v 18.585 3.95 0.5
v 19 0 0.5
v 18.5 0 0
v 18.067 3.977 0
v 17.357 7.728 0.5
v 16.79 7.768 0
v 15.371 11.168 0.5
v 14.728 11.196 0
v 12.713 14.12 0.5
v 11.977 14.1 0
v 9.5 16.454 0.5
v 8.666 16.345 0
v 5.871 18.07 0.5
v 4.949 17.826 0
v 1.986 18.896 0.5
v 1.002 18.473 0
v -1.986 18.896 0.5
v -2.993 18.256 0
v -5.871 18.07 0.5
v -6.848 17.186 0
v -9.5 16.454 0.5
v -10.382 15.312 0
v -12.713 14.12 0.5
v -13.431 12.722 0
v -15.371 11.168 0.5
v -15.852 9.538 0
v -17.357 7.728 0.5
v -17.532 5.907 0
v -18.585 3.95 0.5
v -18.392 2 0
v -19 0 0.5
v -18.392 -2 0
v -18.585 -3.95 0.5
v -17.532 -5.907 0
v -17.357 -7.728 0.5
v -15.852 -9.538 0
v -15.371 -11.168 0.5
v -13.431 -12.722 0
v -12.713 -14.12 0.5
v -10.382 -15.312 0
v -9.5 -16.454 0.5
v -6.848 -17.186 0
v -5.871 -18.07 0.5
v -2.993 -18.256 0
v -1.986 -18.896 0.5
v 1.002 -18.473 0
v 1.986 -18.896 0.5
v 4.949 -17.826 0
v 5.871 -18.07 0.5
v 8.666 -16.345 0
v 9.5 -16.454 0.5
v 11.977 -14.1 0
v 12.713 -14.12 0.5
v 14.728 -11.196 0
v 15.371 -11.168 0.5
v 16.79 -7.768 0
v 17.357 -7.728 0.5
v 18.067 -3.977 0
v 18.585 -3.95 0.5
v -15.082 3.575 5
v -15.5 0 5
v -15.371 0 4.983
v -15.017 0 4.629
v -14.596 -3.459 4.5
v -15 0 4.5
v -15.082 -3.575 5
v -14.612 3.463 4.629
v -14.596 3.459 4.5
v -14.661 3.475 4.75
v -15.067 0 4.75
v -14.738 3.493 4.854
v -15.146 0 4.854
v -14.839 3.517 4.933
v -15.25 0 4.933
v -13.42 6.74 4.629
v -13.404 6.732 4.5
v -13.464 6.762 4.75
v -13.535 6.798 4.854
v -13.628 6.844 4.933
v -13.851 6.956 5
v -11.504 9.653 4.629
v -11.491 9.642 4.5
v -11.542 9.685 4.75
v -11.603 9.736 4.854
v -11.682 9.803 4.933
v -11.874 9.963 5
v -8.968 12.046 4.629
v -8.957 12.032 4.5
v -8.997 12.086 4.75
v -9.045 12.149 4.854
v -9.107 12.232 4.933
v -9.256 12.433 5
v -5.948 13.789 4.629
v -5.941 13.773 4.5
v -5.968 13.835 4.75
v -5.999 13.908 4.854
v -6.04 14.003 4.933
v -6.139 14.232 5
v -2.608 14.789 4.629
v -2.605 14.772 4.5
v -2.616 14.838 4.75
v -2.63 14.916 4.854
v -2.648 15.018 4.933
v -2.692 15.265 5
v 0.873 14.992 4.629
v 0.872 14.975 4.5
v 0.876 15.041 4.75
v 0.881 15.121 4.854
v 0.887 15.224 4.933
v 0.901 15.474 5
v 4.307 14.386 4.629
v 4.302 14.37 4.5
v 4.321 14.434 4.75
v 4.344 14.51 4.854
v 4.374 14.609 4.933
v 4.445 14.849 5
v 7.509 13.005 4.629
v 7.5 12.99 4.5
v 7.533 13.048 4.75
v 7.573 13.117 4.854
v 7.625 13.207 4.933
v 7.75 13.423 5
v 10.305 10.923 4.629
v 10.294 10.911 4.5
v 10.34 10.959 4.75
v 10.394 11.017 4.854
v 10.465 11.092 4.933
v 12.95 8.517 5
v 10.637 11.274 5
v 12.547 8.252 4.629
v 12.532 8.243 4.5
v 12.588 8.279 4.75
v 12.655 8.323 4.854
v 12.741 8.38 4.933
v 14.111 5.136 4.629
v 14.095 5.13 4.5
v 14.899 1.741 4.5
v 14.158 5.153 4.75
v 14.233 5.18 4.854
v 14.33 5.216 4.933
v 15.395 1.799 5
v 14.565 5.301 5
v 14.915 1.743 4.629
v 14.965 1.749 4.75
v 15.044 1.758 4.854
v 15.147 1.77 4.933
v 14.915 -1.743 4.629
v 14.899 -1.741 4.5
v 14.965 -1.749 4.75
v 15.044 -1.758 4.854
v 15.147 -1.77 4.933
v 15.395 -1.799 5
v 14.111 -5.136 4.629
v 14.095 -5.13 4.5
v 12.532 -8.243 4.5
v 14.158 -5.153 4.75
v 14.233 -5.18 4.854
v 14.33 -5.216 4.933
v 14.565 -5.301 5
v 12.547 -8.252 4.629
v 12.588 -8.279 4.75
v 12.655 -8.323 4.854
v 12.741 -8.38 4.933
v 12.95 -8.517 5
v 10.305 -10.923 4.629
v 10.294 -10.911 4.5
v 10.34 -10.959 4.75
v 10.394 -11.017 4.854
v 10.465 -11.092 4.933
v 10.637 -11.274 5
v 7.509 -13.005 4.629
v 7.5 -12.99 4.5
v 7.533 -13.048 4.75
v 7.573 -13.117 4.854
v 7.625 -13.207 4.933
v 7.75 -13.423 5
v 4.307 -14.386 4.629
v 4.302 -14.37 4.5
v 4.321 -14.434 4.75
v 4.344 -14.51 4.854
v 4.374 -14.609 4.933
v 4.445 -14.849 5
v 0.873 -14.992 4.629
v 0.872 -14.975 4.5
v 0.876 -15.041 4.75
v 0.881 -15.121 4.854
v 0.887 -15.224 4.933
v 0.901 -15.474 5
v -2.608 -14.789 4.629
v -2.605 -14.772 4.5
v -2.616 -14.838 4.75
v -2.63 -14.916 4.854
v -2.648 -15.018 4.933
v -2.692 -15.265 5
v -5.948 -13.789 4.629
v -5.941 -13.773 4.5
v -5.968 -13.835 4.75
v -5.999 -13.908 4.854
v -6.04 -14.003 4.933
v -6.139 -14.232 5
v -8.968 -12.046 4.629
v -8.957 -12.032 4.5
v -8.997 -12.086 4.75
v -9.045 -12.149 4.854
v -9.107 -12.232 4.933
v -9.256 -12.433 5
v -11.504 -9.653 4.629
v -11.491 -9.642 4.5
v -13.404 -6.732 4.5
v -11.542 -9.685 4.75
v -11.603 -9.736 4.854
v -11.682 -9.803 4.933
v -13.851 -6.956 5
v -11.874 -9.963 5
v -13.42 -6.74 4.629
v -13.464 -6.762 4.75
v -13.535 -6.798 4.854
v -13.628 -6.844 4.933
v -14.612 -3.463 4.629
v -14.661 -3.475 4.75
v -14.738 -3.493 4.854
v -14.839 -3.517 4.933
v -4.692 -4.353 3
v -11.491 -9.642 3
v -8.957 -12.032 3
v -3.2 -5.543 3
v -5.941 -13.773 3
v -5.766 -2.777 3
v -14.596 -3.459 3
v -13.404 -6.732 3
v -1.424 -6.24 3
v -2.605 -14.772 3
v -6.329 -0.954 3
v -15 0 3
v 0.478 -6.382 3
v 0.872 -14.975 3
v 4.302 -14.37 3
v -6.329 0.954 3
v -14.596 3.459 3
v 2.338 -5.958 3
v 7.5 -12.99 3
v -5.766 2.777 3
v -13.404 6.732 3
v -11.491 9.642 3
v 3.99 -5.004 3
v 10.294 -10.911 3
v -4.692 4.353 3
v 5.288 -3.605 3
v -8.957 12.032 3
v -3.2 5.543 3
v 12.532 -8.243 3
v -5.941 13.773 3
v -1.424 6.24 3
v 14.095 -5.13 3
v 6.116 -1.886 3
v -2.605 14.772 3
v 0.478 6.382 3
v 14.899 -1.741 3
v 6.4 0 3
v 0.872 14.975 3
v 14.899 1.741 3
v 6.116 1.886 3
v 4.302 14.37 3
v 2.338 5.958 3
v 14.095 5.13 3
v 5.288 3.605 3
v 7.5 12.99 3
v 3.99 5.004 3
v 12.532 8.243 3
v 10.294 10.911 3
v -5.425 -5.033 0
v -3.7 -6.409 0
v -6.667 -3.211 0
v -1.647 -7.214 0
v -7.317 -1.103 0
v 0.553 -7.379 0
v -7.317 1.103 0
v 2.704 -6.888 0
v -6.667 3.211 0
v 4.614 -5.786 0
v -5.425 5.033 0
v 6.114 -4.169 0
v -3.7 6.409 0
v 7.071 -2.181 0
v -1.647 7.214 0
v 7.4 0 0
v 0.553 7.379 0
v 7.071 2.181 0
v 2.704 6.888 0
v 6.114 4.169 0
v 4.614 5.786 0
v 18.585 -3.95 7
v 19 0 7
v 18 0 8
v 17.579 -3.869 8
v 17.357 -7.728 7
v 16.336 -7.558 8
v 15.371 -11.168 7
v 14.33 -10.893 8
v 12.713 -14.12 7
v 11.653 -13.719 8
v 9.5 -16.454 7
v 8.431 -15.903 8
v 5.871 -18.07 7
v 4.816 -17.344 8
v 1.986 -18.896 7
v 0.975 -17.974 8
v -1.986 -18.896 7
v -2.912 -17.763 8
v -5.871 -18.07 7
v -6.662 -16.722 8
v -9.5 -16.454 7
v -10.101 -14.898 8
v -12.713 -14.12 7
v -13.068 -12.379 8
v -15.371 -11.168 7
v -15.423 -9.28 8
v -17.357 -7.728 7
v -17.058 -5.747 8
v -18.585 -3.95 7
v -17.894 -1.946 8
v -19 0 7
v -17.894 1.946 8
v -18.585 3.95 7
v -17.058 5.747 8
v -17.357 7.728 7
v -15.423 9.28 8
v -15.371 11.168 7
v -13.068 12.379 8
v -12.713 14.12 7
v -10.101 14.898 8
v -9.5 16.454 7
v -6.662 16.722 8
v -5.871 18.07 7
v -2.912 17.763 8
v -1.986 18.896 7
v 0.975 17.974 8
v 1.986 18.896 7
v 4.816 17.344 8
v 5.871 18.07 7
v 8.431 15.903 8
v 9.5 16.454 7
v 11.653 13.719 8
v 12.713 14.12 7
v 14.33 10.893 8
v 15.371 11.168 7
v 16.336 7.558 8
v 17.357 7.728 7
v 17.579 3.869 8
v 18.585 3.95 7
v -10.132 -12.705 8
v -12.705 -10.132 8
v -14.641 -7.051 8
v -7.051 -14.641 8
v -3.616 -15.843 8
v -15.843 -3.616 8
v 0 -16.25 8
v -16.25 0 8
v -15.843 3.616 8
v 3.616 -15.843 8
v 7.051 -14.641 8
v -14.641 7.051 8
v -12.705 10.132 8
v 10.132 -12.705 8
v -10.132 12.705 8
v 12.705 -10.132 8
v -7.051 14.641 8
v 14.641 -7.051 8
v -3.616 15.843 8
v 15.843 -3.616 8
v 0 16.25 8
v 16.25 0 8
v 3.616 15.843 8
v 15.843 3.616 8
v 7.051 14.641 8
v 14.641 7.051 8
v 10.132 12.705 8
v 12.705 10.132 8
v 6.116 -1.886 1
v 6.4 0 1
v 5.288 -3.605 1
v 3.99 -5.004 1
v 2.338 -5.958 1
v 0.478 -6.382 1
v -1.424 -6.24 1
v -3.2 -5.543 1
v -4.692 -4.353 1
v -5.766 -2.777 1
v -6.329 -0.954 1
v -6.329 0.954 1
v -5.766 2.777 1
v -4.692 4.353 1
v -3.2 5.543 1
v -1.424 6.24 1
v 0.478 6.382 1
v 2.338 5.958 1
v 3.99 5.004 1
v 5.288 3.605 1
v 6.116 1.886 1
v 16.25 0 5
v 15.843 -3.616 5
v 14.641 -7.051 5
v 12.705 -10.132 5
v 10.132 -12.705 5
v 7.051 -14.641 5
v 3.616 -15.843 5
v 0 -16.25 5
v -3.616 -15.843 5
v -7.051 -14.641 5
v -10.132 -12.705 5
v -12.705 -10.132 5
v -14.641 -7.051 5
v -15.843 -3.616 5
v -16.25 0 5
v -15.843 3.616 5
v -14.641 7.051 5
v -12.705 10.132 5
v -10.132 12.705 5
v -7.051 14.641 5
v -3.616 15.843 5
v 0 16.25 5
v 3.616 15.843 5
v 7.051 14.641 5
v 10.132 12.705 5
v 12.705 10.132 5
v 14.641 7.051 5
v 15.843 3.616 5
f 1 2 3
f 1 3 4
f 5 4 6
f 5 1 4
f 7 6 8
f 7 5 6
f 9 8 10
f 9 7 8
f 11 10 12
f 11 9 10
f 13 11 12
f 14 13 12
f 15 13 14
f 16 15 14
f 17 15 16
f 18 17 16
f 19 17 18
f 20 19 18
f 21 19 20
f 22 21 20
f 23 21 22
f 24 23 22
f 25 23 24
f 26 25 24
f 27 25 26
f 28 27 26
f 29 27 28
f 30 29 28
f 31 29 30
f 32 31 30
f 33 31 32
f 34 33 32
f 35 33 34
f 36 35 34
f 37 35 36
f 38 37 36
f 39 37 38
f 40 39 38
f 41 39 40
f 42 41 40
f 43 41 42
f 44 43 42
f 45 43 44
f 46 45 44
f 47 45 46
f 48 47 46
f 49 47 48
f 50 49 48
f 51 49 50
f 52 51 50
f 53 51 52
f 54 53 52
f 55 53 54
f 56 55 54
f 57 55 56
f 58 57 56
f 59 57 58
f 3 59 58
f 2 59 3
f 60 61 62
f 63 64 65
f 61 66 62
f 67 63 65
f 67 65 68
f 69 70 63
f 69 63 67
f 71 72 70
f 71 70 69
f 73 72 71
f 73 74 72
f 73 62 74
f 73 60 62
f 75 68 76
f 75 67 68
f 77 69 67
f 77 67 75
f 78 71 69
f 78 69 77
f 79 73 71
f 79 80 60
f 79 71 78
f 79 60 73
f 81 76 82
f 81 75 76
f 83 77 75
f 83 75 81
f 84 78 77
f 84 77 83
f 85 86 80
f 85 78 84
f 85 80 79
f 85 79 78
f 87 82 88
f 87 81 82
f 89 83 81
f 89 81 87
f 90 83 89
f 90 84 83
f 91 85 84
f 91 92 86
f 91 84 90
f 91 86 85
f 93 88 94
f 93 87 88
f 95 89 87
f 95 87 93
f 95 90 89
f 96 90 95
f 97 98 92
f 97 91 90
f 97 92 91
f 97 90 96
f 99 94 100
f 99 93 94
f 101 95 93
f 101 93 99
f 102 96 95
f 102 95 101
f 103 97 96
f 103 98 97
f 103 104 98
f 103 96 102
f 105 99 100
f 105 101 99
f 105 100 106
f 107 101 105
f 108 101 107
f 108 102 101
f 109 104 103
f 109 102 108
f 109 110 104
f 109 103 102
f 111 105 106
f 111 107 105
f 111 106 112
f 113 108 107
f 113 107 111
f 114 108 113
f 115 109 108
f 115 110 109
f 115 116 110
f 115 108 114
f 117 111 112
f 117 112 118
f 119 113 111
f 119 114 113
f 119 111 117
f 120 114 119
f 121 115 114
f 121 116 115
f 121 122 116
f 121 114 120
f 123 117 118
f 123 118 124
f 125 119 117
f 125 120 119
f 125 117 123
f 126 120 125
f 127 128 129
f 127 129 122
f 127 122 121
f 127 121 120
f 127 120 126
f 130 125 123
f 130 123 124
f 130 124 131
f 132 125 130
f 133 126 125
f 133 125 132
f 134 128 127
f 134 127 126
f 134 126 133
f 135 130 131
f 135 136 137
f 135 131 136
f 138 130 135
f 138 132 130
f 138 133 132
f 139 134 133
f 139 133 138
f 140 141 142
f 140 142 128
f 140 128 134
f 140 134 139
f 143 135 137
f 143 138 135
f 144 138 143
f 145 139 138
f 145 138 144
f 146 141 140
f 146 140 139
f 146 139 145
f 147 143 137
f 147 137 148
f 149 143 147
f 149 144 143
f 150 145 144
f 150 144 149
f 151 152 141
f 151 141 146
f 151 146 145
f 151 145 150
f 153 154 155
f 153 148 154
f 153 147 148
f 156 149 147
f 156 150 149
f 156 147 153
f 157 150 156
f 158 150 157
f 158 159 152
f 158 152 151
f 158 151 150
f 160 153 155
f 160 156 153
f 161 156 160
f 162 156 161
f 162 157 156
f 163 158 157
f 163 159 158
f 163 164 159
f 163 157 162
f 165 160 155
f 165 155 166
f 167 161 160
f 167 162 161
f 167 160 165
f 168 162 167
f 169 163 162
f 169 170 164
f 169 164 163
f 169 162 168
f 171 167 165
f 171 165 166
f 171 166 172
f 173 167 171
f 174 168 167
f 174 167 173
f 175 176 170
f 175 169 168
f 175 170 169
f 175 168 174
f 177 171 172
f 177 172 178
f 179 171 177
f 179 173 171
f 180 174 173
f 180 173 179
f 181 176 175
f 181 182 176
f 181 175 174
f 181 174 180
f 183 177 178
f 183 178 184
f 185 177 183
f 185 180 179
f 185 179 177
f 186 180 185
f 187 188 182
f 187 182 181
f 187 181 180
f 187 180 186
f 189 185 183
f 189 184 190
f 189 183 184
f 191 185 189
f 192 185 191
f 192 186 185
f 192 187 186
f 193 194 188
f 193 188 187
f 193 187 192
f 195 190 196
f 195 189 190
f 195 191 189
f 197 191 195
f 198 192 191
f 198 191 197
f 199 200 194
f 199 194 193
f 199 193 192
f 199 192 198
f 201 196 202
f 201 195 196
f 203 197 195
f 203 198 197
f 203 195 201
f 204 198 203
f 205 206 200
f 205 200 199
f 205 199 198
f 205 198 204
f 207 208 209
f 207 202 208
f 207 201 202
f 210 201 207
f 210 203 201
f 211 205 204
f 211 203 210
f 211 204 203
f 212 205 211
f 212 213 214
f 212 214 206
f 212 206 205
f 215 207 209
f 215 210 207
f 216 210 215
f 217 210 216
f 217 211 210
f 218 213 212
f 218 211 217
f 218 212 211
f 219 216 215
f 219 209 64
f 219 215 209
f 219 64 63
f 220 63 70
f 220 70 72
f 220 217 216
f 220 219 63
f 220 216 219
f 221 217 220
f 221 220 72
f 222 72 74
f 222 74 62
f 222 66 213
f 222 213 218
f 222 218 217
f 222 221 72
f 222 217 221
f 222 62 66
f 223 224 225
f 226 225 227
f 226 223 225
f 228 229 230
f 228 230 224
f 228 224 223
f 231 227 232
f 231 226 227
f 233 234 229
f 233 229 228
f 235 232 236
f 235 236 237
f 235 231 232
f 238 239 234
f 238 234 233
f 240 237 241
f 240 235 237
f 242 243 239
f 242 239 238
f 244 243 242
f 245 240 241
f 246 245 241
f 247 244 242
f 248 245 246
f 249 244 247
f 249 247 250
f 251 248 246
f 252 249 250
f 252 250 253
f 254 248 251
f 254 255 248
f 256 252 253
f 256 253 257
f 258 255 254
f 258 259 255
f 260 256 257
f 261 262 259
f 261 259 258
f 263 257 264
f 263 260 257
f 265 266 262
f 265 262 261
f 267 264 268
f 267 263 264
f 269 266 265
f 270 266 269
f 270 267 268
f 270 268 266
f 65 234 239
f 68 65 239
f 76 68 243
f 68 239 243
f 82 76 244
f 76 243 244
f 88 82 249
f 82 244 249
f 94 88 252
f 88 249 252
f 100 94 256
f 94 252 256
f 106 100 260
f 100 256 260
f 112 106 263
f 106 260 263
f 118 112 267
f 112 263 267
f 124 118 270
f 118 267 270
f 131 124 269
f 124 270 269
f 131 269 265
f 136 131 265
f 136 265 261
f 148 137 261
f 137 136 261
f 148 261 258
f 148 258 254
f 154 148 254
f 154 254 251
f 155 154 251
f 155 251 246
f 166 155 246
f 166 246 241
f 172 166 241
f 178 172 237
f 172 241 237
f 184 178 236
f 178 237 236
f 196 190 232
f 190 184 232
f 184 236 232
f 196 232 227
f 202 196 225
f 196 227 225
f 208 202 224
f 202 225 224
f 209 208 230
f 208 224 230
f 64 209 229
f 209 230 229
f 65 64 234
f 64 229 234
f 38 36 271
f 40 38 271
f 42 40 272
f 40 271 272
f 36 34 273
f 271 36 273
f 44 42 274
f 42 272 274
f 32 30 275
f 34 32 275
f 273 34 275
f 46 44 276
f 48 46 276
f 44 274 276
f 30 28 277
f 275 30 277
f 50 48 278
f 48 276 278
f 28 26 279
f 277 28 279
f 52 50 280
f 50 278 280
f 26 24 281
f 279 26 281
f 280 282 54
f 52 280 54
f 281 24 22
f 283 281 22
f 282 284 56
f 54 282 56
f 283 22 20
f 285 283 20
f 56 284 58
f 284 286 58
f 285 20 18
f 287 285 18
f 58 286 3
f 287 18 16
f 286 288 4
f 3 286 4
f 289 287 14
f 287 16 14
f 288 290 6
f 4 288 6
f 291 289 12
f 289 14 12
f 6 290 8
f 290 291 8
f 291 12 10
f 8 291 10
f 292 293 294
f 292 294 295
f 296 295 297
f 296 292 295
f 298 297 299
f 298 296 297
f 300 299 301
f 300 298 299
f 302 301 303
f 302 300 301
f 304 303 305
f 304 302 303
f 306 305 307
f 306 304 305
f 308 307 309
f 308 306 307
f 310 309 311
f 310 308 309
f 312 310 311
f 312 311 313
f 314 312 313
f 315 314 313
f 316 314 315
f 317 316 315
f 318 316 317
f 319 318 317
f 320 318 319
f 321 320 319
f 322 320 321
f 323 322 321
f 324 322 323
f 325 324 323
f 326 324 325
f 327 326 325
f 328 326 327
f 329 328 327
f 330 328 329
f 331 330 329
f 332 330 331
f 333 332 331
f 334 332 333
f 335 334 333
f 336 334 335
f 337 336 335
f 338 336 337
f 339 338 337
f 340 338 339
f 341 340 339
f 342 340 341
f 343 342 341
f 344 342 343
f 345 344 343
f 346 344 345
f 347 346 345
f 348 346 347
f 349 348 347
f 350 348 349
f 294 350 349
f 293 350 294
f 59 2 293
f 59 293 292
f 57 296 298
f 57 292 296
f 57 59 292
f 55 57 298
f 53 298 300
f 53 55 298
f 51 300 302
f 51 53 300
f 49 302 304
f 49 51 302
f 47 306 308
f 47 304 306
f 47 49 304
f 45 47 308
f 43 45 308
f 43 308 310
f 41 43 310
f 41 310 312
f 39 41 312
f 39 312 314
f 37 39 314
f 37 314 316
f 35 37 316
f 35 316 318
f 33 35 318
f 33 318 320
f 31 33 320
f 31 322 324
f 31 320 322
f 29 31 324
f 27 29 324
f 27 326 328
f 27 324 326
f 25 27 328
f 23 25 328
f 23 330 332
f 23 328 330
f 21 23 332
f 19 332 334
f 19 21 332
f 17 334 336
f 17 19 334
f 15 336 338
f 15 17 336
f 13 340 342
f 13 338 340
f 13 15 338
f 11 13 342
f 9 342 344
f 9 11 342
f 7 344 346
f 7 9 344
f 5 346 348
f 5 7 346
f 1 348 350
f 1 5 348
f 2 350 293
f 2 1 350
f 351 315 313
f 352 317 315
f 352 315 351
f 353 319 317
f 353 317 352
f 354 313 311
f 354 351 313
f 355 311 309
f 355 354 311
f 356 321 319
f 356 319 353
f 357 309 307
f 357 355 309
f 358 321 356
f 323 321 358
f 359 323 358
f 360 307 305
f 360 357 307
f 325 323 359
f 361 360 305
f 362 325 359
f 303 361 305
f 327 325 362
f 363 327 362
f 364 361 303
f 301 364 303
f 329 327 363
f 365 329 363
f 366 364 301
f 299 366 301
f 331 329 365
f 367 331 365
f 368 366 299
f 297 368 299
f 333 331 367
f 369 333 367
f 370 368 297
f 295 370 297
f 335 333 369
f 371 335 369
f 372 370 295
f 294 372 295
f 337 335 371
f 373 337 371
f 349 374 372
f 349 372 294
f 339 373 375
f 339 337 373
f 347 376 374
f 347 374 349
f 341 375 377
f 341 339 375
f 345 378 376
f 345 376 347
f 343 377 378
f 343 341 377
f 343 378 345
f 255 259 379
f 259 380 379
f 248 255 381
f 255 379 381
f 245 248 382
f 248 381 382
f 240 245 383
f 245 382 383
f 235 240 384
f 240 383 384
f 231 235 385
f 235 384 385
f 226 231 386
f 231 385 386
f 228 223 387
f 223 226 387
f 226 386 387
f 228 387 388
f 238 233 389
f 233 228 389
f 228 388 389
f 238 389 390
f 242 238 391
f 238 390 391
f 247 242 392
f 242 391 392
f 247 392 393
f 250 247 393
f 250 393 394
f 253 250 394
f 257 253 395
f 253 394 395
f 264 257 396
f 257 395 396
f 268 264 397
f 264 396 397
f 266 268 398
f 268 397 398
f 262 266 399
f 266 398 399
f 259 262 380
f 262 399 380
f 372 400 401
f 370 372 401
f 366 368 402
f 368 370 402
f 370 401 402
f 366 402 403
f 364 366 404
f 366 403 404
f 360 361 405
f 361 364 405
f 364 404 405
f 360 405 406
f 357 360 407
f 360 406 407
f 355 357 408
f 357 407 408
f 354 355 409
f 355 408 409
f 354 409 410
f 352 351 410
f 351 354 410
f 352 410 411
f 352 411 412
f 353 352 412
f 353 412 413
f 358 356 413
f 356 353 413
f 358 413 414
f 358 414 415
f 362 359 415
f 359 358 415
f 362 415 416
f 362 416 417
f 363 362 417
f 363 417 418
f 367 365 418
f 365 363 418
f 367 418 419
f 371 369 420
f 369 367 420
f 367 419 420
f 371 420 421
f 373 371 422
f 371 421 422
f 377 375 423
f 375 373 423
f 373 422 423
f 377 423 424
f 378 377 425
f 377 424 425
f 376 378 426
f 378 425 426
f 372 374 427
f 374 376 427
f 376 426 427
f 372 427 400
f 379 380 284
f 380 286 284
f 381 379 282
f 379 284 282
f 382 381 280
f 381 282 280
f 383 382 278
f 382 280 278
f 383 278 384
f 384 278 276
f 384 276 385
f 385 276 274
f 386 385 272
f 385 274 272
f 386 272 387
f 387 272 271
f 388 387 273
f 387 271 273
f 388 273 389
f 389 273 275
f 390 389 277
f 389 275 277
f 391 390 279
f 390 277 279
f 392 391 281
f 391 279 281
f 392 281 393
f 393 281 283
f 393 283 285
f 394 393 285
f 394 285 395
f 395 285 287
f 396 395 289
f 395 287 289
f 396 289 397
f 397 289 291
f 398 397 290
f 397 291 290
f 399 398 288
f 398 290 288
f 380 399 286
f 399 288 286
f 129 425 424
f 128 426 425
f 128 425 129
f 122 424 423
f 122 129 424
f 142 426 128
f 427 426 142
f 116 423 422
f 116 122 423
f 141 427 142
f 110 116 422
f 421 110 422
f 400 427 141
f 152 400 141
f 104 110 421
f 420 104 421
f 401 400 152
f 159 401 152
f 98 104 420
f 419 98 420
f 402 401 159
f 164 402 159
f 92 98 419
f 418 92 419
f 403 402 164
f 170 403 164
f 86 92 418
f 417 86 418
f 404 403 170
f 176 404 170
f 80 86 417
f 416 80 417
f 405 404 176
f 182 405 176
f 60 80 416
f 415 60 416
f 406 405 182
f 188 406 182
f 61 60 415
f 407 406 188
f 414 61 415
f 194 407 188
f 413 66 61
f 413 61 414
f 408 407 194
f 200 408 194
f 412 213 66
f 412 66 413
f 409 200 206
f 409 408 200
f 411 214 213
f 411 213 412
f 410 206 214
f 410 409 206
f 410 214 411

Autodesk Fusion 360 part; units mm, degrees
sketch "Sketch1" plane through (0, 0, 0) normal (0, 0, 1) x (1, 0, 0)
  circle A0 centre (0, 0) radius 16.25
  circle A1 centre (0, 0) radius 19
  circle A2 centre (0, 0) radius 6.4
  dimension "d1" = 32.5
  dimension "d2" = 38
  dimension "d3" = 12.8
extrude "Extrude1" add sketch "Sketch1" along normal blind 8 contours A1
extrude "Extrude2" add sketch "Sketch1" along normal blind 3 contours A0
chamfer "Chamfer1" distance 1 angle 45 1 edges at (-17.7142, -6.8707, 8)
chamfer "Chamfer2" distance 1 angle 45 1 edges at (-5.9669, 2.3143, 0)
sketch "Sketch2" plane through (0, 0, 3) normal (0, 0, 1) x (-1, 0, 0)
  circle A0 centre (0, 0) radius 6.4
  circle A1 centre (0, 0) radius 16.25
  circle A2 centre (0, 0) radius 15
  dimension "d10" = 30
extrude "Extrude3" add sketch "Sketch2" along normal blind 2 contours A1
fillet "Fillet1" radius 0.5 1 edges at (13.9849, -5.4242, 5)
chamfer "Chamfer3" distance 0.5 angle 45 1 edges at (-17.7142, -6.8707, 0)
